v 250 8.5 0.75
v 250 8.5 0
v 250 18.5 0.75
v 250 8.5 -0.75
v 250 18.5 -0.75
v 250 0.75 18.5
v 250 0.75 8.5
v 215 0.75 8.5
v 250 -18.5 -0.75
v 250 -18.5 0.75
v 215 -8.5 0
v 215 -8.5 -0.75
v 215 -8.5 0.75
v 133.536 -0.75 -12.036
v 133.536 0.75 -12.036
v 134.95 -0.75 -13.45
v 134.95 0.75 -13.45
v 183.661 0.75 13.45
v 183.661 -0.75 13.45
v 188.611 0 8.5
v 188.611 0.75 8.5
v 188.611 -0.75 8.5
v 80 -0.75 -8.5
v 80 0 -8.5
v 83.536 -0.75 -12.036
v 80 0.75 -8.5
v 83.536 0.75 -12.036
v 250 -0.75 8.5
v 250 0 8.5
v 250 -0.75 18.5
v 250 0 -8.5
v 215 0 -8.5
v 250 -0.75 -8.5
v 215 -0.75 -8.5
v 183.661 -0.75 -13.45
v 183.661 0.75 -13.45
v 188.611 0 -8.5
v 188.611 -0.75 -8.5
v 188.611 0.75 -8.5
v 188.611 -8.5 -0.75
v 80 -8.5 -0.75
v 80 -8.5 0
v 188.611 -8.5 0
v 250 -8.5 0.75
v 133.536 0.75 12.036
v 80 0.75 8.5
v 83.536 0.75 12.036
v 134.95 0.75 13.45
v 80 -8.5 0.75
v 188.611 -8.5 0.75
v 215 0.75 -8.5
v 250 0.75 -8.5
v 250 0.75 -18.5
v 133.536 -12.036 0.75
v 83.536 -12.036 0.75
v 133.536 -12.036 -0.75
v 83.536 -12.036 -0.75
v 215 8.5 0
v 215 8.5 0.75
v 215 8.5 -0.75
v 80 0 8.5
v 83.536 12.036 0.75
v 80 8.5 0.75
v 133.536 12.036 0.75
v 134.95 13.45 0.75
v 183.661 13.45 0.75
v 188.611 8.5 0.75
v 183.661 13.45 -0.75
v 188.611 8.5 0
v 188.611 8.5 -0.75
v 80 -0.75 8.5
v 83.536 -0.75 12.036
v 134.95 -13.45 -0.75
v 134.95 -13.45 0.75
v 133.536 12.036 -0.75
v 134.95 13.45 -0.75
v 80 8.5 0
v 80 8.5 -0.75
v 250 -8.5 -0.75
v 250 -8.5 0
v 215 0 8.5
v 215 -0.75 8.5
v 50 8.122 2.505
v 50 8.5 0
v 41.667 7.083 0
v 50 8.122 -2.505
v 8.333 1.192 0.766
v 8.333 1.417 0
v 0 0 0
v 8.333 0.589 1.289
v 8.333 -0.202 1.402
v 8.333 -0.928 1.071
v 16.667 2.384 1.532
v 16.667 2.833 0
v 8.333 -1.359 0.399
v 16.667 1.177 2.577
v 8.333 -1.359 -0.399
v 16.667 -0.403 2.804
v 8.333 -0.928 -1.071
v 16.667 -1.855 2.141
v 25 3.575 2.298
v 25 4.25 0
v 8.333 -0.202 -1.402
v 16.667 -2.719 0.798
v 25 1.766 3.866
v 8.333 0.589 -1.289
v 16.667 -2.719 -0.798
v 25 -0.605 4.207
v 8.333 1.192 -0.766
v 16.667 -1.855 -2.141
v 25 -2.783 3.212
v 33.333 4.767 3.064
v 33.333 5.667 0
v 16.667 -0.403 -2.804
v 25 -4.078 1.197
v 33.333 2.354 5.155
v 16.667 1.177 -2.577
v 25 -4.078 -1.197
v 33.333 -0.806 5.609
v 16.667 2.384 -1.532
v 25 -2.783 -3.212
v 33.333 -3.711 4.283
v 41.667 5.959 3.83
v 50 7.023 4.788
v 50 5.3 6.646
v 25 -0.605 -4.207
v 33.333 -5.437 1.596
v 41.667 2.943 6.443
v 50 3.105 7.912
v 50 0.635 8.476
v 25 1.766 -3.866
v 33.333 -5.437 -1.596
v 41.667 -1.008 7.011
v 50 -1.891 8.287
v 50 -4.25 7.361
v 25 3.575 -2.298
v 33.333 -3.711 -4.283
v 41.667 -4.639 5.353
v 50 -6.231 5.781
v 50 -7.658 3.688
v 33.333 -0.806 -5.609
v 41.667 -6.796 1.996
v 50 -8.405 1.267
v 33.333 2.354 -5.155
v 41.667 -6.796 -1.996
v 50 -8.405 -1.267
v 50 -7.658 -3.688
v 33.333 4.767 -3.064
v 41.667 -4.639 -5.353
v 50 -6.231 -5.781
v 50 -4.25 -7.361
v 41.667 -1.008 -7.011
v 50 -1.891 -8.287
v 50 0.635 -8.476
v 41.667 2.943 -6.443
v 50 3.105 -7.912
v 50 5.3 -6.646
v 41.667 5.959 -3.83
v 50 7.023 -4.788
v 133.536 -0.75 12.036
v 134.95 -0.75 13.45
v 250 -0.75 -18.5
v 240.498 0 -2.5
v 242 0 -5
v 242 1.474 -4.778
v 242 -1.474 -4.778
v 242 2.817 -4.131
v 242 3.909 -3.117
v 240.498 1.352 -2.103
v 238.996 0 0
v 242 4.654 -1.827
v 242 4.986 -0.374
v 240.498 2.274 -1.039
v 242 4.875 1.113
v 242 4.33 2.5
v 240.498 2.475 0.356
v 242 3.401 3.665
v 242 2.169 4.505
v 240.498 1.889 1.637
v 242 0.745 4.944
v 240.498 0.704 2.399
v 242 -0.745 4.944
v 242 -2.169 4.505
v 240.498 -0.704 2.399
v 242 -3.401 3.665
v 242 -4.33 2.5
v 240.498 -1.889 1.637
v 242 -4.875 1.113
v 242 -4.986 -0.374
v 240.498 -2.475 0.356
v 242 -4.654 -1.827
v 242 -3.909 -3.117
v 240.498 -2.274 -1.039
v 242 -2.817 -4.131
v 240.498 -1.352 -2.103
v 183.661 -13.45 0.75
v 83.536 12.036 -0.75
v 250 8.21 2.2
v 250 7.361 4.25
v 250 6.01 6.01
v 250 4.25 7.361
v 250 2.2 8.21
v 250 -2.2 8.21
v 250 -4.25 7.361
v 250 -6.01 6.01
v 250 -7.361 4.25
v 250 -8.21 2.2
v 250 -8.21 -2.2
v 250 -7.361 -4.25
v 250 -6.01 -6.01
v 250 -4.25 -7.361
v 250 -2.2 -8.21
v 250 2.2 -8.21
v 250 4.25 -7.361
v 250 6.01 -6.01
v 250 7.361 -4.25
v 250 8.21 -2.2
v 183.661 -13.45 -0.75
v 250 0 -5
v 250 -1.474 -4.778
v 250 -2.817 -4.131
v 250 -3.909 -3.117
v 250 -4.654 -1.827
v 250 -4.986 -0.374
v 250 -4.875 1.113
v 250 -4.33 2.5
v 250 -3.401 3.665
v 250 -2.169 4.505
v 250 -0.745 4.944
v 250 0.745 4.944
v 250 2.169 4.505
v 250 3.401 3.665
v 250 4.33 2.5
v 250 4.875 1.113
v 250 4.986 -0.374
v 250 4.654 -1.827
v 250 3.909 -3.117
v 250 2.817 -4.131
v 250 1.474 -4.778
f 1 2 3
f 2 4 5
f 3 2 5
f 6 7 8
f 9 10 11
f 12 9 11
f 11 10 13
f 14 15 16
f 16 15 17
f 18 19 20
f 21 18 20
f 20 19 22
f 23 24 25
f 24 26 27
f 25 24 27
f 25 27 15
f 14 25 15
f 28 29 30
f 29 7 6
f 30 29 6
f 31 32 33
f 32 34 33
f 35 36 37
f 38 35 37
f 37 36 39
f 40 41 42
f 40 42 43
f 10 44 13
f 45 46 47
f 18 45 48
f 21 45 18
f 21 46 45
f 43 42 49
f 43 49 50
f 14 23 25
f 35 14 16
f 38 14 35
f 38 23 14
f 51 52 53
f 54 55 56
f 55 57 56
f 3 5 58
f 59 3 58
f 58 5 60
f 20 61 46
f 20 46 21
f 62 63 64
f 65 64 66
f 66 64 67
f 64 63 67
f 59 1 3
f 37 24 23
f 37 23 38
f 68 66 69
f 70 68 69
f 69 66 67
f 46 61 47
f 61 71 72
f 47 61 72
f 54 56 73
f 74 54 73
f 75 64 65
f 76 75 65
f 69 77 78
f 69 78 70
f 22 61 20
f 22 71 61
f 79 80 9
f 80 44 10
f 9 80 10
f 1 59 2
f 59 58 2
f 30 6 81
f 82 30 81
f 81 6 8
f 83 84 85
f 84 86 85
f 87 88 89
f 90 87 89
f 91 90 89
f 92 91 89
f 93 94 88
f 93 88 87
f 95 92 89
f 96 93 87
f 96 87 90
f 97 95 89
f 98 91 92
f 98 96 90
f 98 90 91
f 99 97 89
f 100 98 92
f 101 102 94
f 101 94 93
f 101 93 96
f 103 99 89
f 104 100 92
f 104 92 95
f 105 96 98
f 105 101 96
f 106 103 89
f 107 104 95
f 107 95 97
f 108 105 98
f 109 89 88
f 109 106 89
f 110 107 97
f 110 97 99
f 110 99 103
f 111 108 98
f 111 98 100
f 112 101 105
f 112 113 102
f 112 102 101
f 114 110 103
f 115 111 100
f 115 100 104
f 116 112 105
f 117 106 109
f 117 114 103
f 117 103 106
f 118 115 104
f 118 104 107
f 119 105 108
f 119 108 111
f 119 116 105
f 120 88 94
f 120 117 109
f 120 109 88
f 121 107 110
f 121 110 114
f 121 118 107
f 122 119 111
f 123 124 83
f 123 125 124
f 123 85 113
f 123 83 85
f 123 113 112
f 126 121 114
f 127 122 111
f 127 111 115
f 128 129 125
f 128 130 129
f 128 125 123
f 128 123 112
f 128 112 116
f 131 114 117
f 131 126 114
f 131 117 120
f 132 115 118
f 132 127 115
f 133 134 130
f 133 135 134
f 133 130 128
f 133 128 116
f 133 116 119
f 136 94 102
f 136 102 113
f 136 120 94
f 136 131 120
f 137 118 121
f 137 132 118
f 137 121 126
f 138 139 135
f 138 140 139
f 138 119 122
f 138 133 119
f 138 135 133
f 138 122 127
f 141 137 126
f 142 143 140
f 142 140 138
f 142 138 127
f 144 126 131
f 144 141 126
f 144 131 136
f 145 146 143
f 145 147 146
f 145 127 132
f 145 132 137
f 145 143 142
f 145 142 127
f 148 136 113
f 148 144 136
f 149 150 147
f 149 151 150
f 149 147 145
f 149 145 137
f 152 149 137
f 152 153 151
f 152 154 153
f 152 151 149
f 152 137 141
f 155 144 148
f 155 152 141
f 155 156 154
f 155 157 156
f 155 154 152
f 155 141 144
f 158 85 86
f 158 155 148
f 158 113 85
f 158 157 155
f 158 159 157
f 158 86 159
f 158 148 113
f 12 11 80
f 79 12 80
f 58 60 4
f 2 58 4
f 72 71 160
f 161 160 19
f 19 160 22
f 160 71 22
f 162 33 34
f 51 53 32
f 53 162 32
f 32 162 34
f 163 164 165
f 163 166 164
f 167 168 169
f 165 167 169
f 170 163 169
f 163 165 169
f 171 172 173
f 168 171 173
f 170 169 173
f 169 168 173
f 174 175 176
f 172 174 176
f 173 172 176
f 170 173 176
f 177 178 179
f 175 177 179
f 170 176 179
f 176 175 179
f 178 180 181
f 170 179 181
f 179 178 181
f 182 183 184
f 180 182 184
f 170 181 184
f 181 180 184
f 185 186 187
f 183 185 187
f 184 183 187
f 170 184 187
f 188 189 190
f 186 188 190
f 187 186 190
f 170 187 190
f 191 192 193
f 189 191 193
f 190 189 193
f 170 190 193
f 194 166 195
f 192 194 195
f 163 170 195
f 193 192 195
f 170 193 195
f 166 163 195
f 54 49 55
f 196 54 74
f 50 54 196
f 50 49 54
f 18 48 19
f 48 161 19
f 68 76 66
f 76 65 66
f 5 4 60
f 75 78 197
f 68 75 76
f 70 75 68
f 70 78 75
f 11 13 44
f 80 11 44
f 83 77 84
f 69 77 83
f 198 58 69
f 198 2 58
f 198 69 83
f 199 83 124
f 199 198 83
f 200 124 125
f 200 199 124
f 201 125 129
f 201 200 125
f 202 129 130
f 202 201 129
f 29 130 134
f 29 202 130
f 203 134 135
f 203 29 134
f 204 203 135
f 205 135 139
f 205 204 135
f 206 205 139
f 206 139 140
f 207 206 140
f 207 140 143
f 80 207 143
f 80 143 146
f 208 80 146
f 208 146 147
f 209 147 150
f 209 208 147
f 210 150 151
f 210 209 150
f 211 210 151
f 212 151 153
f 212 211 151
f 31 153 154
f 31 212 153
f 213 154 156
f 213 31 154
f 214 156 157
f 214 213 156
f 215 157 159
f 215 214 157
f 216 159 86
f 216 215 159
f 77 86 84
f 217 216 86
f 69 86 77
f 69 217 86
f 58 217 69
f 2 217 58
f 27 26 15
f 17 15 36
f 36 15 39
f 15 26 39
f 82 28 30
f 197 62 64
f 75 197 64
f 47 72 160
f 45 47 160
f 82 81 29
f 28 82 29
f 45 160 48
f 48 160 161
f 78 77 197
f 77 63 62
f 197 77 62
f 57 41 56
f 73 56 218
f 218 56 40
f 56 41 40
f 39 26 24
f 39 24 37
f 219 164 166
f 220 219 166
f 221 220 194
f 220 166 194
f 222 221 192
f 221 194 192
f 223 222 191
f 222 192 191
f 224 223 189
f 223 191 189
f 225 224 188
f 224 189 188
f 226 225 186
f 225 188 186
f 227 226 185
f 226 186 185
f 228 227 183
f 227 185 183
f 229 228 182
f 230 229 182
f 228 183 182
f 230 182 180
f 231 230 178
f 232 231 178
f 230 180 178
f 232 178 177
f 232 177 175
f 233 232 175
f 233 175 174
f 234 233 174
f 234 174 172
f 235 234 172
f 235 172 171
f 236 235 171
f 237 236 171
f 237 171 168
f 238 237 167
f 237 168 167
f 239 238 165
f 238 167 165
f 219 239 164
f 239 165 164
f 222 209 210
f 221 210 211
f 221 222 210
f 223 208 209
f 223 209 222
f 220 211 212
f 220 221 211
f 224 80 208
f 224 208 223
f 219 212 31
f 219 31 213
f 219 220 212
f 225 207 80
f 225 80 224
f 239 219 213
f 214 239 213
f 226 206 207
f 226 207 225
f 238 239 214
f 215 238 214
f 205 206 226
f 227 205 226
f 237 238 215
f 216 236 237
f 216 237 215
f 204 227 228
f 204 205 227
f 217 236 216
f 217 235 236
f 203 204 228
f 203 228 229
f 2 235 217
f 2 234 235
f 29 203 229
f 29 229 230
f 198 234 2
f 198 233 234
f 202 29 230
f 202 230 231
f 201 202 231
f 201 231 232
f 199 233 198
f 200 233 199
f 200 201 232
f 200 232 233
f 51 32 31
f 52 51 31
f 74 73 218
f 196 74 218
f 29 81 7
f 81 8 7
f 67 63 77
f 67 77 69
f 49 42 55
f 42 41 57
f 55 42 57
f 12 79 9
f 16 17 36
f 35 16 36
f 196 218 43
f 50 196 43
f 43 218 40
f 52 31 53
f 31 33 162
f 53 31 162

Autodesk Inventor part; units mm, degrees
ref_plane "YZ Plane" through (0, 0, 0) normal (1, 0, 0) x (0, 1, 0)
ref_plane "XZ Plane" through (0, 0, 0) normal (0, 1, 0) x (-1, 0, 0)
ref_plane "XY Plane" through (0, 0, 0) normal (0, 0, 1) x (1, 0, 0)
sketch "Esboço2" plane through (0, 0, 0) normal (0, 0, 1) x (1, 0, 0)
  line L0 (0, 0) -> (250, 0)
  line L1 (0, 0) -> (50, 8.5)
  line L2 (0, 0) -> (50.7174, 0) construction
  line L3 (50, 8.5) -> (250, 8.5)
  line L4 (250, 8.5) -> (250, 0)
  line L5 (50, 8.5) -> (50, 0)
  line L6 (50, 8.5) -> (60, 8.5)
  line L7 (60, 8.5) -> (60, 0)
  line L8 (250, 0) -> (369.4937, 0)
  dimension "d5" = 17
  dimension "d7" = 50
  dimension "d9" = 10
  dimension "d61" = 200
revolve "Revolução1" add sketch "Esboço2" angle 360 about axis through (0, 0, 0) along (1, 0, 0)
sketch "Esboço3" plane through (0, 0, 0) normal (0, 0, 1) x (1, 0, 0)
  line L0 (50, -8.5) -> (250, -8.5) projected
  line L1 (50, -8.5) -> (80, -8.5)
  line L2 (80, -8.5) -> (83.5355, -12.0355)
  line L3 (80, -8.5) -> (85, -8.5) construction
  line L4 (83.5355, -12.0355) -> (133.5355, -12.0355)
  line L5 (133.5355, -12.0355) -> (133.5355, -8.5)
  line L6 (133.5355, -12.0355) -> (134.9497, -13.4497)
  line L7 (134.9497, -13.4497) -> (183.6612, -13.4497)
  line L8 (183.6612, -13.4497) -> (183.6612, -8.5)
  line L9 (183.6612, -13.4497) -> (185.6612, -13.4497) construction
  line L10 (50, -8.5) -> (250, -8.5) projected
  line L11 (183.6612, -13.4497) -> (188.6109, -8.5)
  point P0 (0, 0)
  dimension "d11" = 30
  dimension "d12" = 5
  dimension "d13" = 45
  dimension "d14" = 50
  dimension "d15" = 2
extrude "Extrusão1" add sketch "Esboço3" along normal mid plane 1.5
pattern_circular "Padrão circular1" count 4 over 360 about axis through (150, 0, 0) along (1, 0, 0) of "Extrusão1"
sketch "Esboço5" plane through (0, 0, 0) normal (0, 1, 0) x (-1, 0, 0)
  line L0 (-80, -8.5) -> (-188.6109, -8.5) projected
  line L1 (-50, -8.5) -> (-250, -8.5) projected
  line L2 (-250, 8.5) -> (-250, -8.5) projected
  line L3 (-250, -8.5) -> (-250, -18.5)
  line L4 (-250, -18.5) -> (-215, -8.5)
  point P0 (0, 0)
  point P1 (-183.6612, -8.5)
  point P2 (-185.4738, -8.5)
  dimension "d46" = 10
  dimension "d62" = 35
sketch "Esboço7" plane through (250, 0, 0) normal (1, 0, 0) x (0, -1, 0)
  circle A0 centre (0, 0) radius 5
  dimension "d38" = 10
hole "Furo1" at (250, 0, 0) direction (-1, 0, 0) diameter 10 depth 8 tip angle 118
extrude "Extrusão5" add sketch "Esboço5" along normal mid plane 1.5
pattern_circular "Padrão circular5" count 4 over 360 about axis through (150, 0, 0) along (1, 0, 0) of "Extrusão5"
sketch "Esboço10" plane through (0, 0, 0) normal (0, 0, 1) x (1, 0, 0)
  point P0 (0, 0)
properties part number "idk"
